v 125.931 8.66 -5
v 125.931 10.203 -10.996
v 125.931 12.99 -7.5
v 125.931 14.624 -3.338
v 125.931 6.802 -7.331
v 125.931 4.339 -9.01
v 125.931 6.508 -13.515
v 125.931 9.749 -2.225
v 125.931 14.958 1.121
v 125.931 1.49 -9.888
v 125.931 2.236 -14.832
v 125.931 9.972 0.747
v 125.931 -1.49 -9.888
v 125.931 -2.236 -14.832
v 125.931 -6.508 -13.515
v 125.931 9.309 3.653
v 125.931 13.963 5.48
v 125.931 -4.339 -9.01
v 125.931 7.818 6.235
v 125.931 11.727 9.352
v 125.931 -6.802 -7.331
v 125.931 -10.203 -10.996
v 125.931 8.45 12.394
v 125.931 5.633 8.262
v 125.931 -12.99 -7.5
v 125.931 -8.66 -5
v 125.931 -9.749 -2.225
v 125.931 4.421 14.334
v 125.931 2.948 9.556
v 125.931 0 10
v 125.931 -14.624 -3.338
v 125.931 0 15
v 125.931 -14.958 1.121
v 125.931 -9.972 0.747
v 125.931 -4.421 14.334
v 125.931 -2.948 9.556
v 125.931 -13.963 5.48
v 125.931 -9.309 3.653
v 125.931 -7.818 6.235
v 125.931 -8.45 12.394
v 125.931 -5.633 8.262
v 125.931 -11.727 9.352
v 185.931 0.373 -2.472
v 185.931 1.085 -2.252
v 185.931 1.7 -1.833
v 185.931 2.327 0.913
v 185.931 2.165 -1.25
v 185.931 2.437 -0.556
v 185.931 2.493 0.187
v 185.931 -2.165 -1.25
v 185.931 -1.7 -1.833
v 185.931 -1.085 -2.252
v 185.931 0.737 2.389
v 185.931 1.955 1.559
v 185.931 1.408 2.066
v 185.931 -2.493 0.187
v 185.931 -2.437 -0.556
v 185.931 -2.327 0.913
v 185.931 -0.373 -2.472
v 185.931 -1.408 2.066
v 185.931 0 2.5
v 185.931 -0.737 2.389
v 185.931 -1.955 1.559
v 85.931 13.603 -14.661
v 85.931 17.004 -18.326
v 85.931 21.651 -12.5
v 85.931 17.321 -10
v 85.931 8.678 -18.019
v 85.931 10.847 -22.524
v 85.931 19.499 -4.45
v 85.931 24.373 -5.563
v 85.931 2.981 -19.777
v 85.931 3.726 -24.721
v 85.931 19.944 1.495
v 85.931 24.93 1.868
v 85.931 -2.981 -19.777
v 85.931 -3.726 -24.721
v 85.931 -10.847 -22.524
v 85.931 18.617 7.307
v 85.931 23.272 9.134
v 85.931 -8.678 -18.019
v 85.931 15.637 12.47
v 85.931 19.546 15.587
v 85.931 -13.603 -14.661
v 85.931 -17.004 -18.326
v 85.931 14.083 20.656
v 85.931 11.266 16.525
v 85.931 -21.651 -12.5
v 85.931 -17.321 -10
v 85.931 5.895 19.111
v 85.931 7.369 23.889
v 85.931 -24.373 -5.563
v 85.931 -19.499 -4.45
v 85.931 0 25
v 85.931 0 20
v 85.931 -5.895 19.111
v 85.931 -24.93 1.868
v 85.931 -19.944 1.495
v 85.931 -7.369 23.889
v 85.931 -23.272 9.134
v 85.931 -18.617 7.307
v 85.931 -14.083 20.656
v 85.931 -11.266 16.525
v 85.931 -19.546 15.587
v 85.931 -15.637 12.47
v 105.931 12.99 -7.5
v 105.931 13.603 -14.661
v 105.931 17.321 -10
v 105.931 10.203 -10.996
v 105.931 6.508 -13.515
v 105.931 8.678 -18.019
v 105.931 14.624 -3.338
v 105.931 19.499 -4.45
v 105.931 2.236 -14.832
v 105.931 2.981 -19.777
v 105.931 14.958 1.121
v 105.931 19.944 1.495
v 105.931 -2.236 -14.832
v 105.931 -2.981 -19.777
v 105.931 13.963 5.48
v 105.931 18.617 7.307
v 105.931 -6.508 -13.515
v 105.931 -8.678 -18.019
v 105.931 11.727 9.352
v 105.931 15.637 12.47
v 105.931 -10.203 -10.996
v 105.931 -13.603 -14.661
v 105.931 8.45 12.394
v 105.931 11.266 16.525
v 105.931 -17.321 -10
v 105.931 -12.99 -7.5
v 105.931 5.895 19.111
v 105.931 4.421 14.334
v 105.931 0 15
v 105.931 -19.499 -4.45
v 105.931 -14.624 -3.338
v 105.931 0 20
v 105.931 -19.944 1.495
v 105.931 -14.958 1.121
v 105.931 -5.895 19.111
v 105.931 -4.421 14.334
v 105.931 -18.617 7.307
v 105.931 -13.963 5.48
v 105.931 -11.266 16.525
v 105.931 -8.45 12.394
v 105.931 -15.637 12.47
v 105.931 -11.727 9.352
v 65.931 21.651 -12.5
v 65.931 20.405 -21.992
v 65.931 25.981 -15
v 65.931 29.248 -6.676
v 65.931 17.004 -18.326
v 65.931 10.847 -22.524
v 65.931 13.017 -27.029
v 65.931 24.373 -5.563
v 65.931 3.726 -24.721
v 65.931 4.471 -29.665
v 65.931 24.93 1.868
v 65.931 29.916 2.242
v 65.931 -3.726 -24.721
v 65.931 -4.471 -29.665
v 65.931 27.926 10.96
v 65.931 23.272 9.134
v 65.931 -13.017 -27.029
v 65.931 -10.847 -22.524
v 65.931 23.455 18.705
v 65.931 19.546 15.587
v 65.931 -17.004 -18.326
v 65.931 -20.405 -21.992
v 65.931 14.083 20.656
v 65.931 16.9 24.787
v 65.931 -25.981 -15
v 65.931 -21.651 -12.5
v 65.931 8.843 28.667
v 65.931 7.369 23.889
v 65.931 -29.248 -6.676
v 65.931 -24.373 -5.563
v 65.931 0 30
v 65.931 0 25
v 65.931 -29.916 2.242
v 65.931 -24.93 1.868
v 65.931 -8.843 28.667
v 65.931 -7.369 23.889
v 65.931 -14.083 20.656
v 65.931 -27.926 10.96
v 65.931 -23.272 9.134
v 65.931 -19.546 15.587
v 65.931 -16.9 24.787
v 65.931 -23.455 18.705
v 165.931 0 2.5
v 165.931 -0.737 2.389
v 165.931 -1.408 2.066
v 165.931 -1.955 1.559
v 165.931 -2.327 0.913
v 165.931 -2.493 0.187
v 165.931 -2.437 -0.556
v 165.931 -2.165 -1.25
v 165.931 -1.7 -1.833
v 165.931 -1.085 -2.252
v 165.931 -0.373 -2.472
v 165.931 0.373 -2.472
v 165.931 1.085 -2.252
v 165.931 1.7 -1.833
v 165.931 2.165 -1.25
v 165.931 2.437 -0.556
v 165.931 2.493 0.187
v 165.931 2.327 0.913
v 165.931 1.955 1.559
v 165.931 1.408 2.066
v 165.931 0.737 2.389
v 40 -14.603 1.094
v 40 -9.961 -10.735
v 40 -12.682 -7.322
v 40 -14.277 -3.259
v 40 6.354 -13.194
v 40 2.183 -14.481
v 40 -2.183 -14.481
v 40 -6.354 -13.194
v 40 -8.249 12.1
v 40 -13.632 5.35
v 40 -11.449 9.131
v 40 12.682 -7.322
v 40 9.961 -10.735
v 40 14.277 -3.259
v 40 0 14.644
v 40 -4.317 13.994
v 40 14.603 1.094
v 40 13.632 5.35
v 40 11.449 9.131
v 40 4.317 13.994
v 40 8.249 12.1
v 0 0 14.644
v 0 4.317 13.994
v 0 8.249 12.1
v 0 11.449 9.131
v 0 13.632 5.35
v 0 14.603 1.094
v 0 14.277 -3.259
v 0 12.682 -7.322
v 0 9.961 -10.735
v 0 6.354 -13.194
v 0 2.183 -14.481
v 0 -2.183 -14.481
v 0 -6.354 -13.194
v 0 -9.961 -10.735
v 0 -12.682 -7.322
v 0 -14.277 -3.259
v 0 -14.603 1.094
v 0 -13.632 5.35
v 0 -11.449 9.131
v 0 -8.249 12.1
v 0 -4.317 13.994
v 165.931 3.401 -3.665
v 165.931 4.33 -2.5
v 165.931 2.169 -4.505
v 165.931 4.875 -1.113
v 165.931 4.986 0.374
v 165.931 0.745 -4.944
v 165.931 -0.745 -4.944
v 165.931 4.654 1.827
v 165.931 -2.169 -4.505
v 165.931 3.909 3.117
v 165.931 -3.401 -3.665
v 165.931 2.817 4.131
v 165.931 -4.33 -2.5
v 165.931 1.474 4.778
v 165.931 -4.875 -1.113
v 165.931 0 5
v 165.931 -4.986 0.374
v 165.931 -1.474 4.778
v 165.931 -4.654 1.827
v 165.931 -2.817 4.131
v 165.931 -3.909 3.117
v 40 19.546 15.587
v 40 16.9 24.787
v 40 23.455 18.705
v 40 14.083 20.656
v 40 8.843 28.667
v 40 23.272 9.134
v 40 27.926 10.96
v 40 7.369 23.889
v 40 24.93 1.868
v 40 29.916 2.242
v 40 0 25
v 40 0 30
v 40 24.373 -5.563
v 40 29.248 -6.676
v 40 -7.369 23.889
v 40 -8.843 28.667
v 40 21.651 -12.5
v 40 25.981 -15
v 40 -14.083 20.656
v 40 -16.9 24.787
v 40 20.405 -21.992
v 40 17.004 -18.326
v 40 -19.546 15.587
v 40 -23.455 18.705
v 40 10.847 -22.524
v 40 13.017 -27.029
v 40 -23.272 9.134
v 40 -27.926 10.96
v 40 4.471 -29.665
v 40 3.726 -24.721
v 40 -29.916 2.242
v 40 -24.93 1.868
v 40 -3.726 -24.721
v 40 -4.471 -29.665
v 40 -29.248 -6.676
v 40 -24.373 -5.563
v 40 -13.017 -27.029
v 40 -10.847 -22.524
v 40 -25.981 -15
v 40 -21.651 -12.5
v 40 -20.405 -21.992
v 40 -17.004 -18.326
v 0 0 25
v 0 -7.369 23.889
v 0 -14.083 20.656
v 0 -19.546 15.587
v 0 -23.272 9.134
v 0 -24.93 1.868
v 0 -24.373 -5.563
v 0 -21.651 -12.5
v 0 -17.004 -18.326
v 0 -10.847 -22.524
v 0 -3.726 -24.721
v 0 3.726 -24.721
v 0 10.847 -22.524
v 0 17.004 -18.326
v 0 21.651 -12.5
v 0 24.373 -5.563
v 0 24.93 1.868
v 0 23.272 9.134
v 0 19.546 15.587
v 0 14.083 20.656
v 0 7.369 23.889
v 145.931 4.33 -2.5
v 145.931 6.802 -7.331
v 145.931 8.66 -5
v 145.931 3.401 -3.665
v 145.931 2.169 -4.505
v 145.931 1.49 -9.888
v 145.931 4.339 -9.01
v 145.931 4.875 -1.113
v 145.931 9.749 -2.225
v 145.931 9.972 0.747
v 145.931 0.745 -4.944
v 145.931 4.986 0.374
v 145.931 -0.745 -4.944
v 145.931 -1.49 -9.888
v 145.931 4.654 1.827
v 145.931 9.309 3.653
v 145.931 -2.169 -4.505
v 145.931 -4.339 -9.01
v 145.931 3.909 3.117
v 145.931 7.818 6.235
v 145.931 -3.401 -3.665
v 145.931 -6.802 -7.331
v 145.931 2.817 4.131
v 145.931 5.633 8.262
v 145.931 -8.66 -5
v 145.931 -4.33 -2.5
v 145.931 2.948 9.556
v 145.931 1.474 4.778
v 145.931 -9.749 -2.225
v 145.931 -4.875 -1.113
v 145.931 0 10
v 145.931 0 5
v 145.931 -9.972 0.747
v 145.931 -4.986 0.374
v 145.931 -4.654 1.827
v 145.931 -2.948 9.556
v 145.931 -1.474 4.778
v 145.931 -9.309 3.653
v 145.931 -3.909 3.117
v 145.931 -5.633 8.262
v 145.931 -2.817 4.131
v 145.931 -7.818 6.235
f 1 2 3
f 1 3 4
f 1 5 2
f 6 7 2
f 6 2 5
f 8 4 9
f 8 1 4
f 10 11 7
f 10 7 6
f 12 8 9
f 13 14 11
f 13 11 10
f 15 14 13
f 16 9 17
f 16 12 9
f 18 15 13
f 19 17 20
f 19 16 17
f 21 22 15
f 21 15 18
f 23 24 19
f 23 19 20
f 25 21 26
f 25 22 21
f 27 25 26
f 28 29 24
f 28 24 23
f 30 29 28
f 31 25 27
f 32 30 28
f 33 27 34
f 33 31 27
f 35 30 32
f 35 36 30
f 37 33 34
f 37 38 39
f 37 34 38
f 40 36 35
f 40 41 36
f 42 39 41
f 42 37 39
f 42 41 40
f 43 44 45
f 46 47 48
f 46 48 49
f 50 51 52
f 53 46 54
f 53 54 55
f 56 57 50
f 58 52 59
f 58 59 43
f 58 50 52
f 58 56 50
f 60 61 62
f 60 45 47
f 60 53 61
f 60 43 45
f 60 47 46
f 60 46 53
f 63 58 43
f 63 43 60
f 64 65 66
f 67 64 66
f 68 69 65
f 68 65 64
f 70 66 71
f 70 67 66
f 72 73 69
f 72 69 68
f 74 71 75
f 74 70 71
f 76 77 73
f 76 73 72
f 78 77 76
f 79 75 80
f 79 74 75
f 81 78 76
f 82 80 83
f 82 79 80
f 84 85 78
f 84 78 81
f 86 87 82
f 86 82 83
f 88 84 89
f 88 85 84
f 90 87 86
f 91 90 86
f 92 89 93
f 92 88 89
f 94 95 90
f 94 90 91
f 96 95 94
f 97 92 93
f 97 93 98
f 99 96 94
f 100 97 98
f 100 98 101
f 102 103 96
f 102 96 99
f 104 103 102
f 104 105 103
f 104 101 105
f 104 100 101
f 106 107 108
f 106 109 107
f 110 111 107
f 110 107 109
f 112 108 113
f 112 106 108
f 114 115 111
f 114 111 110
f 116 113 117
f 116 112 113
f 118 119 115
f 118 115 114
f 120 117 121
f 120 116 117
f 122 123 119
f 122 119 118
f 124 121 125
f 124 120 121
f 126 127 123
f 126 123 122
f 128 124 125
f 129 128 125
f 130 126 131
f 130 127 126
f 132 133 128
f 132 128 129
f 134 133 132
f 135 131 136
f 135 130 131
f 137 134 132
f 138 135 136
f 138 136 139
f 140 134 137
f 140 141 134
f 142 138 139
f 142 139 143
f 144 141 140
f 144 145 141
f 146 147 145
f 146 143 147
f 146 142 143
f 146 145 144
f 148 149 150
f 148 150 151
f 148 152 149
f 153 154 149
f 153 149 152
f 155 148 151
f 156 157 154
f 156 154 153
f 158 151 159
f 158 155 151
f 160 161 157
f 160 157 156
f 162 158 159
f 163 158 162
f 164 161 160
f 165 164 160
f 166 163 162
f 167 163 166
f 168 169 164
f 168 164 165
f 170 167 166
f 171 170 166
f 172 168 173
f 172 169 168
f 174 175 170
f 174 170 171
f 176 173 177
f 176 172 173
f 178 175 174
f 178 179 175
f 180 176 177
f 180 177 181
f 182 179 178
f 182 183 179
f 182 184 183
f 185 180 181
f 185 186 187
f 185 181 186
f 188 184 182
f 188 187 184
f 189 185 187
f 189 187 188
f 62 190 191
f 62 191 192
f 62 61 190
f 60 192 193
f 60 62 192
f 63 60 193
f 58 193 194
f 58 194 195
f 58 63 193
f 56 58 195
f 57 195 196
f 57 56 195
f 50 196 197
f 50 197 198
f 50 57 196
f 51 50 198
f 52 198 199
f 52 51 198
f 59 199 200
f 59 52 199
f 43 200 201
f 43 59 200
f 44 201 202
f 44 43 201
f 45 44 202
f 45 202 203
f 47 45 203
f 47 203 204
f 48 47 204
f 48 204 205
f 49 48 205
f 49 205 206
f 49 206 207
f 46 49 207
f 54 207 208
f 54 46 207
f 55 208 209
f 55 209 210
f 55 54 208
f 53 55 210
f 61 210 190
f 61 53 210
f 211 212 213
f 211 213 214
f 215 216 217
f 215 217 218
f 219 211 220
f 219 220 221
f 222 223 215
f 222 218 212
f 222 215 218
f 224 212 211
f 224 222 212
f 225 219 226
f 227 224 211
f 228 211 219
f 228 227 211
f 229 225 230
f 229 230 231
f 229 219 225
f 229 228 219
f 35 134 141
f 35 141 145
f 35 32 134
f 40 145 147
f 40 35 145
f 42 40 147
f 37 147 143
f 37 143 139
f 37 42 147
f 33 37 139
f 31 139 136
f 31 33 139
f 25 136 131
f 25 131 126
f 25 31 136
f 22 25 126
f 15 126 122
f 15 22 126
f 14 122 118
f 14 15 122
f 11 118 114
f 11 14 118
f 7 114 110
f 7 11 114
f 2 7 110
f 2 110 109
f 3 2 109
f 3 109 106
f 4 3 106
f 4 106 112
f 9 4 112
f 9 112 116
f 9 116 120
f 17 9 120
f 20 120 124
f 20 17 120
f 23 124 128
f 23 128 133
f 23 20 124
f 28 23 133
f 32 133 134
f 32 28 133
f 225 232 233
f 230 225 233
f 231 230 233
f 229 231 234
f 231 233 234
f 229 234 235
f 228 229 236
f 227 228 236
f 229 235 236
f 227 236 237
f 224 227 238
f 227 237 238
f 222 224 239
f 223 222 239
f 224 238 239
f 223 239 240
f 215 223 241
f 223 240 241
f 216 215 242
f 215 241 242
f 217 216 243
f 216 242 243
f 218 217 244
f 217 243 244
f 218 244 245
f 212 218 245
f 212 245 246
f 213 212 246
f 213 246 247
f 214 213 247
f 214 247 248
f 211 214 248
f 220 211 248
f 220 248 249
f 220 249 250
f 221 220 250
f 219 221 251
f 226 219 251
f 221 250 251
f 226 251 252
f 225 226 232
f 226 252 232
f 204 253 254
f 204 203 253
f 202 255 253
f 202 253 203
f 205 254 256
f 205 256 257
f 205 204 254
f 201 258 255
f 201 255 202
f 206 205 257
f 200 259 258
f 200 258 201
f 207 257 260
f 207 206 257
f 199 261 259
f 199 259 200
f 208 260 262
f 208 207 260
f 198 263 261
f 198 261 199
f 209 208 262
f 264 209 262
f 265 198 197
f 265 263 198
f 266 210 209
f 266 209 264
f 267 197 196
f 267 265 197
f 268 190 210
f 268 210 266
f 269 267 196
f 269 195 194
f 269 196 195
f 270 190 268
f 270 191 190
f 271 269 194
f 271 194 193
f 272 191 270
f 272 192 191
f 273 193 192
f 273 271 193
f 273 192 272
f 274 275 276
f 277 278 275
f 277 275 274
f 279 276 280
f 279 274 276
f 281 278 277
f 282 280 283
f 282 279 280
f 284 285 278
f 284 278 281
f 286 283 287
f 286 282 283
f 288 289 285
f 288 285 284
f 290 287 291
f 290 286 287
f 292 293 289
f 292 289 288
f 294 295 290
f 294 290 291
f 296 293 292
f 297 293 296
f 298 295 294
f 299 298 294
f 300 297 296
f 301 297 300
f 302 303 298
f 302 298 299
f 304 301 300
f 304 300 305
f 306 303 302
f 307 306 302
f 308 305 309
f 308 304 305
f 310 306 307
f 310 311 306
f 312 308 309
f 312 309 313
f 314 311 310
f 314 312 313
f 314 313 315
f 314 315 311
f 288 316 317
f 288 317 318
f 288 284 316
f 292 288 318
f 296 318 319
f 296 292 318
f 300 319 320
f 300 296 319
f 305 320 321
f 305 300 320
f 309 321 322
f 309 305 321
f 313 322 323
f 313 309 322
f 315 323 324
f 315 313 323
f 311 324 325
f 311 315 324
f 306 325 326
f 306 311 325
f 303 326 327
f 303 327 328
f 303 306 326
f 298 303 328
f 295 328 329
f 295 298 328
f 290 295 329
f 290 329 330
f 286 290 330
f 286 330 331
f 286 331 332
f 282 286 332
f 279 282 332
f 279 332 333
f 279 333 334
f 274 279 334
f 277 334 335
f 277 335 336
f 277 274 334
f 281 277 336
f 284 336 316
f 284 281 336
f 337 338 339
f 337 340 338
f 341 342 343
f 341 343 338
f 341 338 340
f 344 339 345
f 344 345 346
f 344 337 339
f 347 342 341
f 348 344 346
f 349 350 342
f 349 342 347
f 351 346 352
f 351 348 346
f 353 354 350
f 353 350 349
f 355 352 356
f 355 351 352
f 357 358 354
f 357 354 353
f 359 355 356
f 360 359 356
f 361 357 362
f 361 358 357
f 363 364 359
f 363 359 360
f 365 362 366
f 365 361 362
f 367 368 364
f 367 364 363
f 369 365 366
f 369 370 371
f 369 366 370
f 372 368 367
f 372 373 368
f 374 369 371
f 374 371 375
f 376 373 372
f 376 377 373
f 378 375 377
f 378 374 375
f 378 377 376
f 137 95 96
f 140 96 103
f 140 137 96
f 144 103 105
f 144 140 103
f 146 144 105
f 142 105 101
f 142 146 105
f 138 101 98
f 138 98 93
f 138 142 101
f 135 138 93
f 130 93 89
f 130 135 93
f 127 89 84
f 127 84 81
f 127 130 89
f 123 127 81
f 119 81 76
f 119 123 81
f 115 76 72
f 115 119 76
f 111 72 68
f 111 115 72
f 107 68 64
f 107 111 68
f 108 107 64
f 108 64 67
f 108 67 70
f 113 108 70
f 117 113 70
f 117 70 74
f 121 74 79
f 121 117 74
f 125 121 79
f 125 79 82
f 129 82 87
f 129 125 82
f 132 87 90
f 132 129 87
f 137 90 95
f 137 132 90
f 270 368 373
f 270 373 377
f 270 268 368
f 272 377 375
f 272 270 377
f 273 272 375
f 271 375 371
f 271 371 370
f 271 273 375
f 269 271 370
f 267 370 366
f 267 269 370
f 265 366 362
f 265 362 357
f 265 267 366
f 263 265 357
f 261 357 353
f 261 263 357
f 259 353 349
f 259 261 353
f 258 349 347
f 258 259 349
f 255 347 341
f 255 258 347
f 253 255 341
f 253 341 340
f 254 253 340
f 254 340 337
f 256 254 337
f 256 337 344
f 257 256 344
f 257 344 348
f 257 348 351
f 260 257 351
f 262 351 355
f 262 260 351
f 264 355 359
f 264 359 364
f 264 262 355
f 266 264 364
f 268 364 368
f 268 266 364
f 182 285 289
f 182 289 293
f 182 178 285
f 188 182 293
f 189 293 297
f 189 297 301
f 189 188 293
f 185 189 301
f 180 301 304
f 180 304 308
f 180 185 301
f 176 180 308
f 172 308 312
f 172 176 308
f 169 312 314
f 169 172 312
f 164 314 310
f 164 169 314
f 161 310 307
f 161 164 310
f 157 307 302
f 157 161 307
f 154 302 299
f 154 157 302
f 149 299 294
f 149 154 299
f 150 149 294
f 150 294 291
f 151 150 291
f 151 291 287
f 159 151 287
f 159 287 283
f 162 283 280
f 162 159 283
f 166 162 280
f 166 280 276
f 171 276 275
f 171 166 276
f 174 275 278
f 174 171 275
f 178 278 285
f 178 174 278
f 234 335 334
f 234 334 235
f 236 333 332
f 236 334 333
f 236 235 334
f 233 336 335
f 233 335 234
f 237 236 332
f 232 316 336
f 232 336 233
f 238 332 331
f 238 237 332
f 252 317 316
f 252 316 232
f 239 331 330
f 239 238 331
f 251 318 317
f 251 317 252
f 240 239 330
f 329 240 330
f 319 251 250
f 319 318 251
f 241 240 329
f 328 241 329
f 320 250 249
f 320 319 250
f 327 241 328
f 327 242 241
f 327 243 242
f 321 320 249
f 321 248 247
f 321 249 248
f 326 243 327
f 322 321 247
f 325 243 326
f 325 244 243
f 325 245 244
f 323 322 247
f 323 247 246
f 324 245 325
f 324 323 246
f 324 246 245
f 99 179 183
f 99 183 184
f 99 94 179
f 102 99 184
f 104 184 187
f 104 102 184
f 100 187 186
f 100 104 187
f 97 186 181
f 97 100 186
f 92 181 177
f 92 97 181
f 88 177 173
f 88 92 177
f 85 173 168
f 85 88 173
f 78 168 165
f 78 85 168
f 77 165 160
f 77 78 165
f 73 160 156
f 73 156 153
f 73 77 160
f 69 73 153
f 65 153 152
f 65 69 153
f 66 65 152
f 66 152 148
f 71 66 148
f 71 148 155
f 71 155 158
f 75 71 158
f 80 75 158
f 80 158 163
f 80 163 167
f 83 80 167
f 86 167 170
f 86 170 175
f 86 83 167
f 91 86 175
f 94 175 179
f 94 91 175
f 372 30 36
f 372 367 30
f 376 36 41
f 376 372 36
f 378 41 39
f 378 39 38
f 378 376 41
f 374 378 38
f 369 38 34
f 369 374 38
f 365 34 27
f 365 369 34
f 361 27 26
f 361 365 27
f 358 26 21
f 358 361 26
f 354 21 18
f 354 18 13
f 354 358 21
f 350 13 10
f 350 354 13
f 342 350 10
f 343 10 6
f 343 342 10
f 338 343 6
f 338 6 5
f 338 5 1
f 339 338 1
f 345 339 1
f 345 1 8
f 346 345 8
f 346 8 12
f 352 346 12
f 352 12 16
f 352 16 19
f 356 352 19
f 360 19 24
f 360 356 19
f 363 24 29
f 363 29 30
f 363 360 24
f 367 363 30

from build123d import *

# Parameters (mm, degrees)
SKETCH2_R          = 14.644408022
CUT_EXTRUDE1_DEPTH = 40


with BuildPart() as part:
    # Sketch1 → Revolve1 (revolve)
    with BuildSketch(Plane.XY, mode=Mode.PRIVATE) as revolve1_sk:
        Polygon((0, 0), (0, -25), (40, -25), (40, -30), (65.930548057, -30), (65.930548057, -25), (85.930548057, -25), (85.930548057, -20), (105.930548057, -20), (105.930548057, -15), (125.930548057, -15), (125.930548057, -10), (145.930548057, -10), (145.930548057, -5), (165.930548057, -5), (165.930548057, -2.5), (185.930548057, -2.5), (185.930548057, 0), align=None)
    revolve(revolve1_sk.sketch.rotate(Axis((0, 0, 0), (1, 0, 0)), 270), axis=Axis((0, 0, 0), (1, 0, 0)))  # turned: the seam where the file's is

    # Sketch2 → Cut-Extrude1 (cut)
    with BuildSketch(Plane.ZY):
        Circle(SKETCH2_R)
    extrude(amount=-CUT_EXTRUDE1_DEPTH, mode=Mode.SUBTRACT)


solid = part.part
